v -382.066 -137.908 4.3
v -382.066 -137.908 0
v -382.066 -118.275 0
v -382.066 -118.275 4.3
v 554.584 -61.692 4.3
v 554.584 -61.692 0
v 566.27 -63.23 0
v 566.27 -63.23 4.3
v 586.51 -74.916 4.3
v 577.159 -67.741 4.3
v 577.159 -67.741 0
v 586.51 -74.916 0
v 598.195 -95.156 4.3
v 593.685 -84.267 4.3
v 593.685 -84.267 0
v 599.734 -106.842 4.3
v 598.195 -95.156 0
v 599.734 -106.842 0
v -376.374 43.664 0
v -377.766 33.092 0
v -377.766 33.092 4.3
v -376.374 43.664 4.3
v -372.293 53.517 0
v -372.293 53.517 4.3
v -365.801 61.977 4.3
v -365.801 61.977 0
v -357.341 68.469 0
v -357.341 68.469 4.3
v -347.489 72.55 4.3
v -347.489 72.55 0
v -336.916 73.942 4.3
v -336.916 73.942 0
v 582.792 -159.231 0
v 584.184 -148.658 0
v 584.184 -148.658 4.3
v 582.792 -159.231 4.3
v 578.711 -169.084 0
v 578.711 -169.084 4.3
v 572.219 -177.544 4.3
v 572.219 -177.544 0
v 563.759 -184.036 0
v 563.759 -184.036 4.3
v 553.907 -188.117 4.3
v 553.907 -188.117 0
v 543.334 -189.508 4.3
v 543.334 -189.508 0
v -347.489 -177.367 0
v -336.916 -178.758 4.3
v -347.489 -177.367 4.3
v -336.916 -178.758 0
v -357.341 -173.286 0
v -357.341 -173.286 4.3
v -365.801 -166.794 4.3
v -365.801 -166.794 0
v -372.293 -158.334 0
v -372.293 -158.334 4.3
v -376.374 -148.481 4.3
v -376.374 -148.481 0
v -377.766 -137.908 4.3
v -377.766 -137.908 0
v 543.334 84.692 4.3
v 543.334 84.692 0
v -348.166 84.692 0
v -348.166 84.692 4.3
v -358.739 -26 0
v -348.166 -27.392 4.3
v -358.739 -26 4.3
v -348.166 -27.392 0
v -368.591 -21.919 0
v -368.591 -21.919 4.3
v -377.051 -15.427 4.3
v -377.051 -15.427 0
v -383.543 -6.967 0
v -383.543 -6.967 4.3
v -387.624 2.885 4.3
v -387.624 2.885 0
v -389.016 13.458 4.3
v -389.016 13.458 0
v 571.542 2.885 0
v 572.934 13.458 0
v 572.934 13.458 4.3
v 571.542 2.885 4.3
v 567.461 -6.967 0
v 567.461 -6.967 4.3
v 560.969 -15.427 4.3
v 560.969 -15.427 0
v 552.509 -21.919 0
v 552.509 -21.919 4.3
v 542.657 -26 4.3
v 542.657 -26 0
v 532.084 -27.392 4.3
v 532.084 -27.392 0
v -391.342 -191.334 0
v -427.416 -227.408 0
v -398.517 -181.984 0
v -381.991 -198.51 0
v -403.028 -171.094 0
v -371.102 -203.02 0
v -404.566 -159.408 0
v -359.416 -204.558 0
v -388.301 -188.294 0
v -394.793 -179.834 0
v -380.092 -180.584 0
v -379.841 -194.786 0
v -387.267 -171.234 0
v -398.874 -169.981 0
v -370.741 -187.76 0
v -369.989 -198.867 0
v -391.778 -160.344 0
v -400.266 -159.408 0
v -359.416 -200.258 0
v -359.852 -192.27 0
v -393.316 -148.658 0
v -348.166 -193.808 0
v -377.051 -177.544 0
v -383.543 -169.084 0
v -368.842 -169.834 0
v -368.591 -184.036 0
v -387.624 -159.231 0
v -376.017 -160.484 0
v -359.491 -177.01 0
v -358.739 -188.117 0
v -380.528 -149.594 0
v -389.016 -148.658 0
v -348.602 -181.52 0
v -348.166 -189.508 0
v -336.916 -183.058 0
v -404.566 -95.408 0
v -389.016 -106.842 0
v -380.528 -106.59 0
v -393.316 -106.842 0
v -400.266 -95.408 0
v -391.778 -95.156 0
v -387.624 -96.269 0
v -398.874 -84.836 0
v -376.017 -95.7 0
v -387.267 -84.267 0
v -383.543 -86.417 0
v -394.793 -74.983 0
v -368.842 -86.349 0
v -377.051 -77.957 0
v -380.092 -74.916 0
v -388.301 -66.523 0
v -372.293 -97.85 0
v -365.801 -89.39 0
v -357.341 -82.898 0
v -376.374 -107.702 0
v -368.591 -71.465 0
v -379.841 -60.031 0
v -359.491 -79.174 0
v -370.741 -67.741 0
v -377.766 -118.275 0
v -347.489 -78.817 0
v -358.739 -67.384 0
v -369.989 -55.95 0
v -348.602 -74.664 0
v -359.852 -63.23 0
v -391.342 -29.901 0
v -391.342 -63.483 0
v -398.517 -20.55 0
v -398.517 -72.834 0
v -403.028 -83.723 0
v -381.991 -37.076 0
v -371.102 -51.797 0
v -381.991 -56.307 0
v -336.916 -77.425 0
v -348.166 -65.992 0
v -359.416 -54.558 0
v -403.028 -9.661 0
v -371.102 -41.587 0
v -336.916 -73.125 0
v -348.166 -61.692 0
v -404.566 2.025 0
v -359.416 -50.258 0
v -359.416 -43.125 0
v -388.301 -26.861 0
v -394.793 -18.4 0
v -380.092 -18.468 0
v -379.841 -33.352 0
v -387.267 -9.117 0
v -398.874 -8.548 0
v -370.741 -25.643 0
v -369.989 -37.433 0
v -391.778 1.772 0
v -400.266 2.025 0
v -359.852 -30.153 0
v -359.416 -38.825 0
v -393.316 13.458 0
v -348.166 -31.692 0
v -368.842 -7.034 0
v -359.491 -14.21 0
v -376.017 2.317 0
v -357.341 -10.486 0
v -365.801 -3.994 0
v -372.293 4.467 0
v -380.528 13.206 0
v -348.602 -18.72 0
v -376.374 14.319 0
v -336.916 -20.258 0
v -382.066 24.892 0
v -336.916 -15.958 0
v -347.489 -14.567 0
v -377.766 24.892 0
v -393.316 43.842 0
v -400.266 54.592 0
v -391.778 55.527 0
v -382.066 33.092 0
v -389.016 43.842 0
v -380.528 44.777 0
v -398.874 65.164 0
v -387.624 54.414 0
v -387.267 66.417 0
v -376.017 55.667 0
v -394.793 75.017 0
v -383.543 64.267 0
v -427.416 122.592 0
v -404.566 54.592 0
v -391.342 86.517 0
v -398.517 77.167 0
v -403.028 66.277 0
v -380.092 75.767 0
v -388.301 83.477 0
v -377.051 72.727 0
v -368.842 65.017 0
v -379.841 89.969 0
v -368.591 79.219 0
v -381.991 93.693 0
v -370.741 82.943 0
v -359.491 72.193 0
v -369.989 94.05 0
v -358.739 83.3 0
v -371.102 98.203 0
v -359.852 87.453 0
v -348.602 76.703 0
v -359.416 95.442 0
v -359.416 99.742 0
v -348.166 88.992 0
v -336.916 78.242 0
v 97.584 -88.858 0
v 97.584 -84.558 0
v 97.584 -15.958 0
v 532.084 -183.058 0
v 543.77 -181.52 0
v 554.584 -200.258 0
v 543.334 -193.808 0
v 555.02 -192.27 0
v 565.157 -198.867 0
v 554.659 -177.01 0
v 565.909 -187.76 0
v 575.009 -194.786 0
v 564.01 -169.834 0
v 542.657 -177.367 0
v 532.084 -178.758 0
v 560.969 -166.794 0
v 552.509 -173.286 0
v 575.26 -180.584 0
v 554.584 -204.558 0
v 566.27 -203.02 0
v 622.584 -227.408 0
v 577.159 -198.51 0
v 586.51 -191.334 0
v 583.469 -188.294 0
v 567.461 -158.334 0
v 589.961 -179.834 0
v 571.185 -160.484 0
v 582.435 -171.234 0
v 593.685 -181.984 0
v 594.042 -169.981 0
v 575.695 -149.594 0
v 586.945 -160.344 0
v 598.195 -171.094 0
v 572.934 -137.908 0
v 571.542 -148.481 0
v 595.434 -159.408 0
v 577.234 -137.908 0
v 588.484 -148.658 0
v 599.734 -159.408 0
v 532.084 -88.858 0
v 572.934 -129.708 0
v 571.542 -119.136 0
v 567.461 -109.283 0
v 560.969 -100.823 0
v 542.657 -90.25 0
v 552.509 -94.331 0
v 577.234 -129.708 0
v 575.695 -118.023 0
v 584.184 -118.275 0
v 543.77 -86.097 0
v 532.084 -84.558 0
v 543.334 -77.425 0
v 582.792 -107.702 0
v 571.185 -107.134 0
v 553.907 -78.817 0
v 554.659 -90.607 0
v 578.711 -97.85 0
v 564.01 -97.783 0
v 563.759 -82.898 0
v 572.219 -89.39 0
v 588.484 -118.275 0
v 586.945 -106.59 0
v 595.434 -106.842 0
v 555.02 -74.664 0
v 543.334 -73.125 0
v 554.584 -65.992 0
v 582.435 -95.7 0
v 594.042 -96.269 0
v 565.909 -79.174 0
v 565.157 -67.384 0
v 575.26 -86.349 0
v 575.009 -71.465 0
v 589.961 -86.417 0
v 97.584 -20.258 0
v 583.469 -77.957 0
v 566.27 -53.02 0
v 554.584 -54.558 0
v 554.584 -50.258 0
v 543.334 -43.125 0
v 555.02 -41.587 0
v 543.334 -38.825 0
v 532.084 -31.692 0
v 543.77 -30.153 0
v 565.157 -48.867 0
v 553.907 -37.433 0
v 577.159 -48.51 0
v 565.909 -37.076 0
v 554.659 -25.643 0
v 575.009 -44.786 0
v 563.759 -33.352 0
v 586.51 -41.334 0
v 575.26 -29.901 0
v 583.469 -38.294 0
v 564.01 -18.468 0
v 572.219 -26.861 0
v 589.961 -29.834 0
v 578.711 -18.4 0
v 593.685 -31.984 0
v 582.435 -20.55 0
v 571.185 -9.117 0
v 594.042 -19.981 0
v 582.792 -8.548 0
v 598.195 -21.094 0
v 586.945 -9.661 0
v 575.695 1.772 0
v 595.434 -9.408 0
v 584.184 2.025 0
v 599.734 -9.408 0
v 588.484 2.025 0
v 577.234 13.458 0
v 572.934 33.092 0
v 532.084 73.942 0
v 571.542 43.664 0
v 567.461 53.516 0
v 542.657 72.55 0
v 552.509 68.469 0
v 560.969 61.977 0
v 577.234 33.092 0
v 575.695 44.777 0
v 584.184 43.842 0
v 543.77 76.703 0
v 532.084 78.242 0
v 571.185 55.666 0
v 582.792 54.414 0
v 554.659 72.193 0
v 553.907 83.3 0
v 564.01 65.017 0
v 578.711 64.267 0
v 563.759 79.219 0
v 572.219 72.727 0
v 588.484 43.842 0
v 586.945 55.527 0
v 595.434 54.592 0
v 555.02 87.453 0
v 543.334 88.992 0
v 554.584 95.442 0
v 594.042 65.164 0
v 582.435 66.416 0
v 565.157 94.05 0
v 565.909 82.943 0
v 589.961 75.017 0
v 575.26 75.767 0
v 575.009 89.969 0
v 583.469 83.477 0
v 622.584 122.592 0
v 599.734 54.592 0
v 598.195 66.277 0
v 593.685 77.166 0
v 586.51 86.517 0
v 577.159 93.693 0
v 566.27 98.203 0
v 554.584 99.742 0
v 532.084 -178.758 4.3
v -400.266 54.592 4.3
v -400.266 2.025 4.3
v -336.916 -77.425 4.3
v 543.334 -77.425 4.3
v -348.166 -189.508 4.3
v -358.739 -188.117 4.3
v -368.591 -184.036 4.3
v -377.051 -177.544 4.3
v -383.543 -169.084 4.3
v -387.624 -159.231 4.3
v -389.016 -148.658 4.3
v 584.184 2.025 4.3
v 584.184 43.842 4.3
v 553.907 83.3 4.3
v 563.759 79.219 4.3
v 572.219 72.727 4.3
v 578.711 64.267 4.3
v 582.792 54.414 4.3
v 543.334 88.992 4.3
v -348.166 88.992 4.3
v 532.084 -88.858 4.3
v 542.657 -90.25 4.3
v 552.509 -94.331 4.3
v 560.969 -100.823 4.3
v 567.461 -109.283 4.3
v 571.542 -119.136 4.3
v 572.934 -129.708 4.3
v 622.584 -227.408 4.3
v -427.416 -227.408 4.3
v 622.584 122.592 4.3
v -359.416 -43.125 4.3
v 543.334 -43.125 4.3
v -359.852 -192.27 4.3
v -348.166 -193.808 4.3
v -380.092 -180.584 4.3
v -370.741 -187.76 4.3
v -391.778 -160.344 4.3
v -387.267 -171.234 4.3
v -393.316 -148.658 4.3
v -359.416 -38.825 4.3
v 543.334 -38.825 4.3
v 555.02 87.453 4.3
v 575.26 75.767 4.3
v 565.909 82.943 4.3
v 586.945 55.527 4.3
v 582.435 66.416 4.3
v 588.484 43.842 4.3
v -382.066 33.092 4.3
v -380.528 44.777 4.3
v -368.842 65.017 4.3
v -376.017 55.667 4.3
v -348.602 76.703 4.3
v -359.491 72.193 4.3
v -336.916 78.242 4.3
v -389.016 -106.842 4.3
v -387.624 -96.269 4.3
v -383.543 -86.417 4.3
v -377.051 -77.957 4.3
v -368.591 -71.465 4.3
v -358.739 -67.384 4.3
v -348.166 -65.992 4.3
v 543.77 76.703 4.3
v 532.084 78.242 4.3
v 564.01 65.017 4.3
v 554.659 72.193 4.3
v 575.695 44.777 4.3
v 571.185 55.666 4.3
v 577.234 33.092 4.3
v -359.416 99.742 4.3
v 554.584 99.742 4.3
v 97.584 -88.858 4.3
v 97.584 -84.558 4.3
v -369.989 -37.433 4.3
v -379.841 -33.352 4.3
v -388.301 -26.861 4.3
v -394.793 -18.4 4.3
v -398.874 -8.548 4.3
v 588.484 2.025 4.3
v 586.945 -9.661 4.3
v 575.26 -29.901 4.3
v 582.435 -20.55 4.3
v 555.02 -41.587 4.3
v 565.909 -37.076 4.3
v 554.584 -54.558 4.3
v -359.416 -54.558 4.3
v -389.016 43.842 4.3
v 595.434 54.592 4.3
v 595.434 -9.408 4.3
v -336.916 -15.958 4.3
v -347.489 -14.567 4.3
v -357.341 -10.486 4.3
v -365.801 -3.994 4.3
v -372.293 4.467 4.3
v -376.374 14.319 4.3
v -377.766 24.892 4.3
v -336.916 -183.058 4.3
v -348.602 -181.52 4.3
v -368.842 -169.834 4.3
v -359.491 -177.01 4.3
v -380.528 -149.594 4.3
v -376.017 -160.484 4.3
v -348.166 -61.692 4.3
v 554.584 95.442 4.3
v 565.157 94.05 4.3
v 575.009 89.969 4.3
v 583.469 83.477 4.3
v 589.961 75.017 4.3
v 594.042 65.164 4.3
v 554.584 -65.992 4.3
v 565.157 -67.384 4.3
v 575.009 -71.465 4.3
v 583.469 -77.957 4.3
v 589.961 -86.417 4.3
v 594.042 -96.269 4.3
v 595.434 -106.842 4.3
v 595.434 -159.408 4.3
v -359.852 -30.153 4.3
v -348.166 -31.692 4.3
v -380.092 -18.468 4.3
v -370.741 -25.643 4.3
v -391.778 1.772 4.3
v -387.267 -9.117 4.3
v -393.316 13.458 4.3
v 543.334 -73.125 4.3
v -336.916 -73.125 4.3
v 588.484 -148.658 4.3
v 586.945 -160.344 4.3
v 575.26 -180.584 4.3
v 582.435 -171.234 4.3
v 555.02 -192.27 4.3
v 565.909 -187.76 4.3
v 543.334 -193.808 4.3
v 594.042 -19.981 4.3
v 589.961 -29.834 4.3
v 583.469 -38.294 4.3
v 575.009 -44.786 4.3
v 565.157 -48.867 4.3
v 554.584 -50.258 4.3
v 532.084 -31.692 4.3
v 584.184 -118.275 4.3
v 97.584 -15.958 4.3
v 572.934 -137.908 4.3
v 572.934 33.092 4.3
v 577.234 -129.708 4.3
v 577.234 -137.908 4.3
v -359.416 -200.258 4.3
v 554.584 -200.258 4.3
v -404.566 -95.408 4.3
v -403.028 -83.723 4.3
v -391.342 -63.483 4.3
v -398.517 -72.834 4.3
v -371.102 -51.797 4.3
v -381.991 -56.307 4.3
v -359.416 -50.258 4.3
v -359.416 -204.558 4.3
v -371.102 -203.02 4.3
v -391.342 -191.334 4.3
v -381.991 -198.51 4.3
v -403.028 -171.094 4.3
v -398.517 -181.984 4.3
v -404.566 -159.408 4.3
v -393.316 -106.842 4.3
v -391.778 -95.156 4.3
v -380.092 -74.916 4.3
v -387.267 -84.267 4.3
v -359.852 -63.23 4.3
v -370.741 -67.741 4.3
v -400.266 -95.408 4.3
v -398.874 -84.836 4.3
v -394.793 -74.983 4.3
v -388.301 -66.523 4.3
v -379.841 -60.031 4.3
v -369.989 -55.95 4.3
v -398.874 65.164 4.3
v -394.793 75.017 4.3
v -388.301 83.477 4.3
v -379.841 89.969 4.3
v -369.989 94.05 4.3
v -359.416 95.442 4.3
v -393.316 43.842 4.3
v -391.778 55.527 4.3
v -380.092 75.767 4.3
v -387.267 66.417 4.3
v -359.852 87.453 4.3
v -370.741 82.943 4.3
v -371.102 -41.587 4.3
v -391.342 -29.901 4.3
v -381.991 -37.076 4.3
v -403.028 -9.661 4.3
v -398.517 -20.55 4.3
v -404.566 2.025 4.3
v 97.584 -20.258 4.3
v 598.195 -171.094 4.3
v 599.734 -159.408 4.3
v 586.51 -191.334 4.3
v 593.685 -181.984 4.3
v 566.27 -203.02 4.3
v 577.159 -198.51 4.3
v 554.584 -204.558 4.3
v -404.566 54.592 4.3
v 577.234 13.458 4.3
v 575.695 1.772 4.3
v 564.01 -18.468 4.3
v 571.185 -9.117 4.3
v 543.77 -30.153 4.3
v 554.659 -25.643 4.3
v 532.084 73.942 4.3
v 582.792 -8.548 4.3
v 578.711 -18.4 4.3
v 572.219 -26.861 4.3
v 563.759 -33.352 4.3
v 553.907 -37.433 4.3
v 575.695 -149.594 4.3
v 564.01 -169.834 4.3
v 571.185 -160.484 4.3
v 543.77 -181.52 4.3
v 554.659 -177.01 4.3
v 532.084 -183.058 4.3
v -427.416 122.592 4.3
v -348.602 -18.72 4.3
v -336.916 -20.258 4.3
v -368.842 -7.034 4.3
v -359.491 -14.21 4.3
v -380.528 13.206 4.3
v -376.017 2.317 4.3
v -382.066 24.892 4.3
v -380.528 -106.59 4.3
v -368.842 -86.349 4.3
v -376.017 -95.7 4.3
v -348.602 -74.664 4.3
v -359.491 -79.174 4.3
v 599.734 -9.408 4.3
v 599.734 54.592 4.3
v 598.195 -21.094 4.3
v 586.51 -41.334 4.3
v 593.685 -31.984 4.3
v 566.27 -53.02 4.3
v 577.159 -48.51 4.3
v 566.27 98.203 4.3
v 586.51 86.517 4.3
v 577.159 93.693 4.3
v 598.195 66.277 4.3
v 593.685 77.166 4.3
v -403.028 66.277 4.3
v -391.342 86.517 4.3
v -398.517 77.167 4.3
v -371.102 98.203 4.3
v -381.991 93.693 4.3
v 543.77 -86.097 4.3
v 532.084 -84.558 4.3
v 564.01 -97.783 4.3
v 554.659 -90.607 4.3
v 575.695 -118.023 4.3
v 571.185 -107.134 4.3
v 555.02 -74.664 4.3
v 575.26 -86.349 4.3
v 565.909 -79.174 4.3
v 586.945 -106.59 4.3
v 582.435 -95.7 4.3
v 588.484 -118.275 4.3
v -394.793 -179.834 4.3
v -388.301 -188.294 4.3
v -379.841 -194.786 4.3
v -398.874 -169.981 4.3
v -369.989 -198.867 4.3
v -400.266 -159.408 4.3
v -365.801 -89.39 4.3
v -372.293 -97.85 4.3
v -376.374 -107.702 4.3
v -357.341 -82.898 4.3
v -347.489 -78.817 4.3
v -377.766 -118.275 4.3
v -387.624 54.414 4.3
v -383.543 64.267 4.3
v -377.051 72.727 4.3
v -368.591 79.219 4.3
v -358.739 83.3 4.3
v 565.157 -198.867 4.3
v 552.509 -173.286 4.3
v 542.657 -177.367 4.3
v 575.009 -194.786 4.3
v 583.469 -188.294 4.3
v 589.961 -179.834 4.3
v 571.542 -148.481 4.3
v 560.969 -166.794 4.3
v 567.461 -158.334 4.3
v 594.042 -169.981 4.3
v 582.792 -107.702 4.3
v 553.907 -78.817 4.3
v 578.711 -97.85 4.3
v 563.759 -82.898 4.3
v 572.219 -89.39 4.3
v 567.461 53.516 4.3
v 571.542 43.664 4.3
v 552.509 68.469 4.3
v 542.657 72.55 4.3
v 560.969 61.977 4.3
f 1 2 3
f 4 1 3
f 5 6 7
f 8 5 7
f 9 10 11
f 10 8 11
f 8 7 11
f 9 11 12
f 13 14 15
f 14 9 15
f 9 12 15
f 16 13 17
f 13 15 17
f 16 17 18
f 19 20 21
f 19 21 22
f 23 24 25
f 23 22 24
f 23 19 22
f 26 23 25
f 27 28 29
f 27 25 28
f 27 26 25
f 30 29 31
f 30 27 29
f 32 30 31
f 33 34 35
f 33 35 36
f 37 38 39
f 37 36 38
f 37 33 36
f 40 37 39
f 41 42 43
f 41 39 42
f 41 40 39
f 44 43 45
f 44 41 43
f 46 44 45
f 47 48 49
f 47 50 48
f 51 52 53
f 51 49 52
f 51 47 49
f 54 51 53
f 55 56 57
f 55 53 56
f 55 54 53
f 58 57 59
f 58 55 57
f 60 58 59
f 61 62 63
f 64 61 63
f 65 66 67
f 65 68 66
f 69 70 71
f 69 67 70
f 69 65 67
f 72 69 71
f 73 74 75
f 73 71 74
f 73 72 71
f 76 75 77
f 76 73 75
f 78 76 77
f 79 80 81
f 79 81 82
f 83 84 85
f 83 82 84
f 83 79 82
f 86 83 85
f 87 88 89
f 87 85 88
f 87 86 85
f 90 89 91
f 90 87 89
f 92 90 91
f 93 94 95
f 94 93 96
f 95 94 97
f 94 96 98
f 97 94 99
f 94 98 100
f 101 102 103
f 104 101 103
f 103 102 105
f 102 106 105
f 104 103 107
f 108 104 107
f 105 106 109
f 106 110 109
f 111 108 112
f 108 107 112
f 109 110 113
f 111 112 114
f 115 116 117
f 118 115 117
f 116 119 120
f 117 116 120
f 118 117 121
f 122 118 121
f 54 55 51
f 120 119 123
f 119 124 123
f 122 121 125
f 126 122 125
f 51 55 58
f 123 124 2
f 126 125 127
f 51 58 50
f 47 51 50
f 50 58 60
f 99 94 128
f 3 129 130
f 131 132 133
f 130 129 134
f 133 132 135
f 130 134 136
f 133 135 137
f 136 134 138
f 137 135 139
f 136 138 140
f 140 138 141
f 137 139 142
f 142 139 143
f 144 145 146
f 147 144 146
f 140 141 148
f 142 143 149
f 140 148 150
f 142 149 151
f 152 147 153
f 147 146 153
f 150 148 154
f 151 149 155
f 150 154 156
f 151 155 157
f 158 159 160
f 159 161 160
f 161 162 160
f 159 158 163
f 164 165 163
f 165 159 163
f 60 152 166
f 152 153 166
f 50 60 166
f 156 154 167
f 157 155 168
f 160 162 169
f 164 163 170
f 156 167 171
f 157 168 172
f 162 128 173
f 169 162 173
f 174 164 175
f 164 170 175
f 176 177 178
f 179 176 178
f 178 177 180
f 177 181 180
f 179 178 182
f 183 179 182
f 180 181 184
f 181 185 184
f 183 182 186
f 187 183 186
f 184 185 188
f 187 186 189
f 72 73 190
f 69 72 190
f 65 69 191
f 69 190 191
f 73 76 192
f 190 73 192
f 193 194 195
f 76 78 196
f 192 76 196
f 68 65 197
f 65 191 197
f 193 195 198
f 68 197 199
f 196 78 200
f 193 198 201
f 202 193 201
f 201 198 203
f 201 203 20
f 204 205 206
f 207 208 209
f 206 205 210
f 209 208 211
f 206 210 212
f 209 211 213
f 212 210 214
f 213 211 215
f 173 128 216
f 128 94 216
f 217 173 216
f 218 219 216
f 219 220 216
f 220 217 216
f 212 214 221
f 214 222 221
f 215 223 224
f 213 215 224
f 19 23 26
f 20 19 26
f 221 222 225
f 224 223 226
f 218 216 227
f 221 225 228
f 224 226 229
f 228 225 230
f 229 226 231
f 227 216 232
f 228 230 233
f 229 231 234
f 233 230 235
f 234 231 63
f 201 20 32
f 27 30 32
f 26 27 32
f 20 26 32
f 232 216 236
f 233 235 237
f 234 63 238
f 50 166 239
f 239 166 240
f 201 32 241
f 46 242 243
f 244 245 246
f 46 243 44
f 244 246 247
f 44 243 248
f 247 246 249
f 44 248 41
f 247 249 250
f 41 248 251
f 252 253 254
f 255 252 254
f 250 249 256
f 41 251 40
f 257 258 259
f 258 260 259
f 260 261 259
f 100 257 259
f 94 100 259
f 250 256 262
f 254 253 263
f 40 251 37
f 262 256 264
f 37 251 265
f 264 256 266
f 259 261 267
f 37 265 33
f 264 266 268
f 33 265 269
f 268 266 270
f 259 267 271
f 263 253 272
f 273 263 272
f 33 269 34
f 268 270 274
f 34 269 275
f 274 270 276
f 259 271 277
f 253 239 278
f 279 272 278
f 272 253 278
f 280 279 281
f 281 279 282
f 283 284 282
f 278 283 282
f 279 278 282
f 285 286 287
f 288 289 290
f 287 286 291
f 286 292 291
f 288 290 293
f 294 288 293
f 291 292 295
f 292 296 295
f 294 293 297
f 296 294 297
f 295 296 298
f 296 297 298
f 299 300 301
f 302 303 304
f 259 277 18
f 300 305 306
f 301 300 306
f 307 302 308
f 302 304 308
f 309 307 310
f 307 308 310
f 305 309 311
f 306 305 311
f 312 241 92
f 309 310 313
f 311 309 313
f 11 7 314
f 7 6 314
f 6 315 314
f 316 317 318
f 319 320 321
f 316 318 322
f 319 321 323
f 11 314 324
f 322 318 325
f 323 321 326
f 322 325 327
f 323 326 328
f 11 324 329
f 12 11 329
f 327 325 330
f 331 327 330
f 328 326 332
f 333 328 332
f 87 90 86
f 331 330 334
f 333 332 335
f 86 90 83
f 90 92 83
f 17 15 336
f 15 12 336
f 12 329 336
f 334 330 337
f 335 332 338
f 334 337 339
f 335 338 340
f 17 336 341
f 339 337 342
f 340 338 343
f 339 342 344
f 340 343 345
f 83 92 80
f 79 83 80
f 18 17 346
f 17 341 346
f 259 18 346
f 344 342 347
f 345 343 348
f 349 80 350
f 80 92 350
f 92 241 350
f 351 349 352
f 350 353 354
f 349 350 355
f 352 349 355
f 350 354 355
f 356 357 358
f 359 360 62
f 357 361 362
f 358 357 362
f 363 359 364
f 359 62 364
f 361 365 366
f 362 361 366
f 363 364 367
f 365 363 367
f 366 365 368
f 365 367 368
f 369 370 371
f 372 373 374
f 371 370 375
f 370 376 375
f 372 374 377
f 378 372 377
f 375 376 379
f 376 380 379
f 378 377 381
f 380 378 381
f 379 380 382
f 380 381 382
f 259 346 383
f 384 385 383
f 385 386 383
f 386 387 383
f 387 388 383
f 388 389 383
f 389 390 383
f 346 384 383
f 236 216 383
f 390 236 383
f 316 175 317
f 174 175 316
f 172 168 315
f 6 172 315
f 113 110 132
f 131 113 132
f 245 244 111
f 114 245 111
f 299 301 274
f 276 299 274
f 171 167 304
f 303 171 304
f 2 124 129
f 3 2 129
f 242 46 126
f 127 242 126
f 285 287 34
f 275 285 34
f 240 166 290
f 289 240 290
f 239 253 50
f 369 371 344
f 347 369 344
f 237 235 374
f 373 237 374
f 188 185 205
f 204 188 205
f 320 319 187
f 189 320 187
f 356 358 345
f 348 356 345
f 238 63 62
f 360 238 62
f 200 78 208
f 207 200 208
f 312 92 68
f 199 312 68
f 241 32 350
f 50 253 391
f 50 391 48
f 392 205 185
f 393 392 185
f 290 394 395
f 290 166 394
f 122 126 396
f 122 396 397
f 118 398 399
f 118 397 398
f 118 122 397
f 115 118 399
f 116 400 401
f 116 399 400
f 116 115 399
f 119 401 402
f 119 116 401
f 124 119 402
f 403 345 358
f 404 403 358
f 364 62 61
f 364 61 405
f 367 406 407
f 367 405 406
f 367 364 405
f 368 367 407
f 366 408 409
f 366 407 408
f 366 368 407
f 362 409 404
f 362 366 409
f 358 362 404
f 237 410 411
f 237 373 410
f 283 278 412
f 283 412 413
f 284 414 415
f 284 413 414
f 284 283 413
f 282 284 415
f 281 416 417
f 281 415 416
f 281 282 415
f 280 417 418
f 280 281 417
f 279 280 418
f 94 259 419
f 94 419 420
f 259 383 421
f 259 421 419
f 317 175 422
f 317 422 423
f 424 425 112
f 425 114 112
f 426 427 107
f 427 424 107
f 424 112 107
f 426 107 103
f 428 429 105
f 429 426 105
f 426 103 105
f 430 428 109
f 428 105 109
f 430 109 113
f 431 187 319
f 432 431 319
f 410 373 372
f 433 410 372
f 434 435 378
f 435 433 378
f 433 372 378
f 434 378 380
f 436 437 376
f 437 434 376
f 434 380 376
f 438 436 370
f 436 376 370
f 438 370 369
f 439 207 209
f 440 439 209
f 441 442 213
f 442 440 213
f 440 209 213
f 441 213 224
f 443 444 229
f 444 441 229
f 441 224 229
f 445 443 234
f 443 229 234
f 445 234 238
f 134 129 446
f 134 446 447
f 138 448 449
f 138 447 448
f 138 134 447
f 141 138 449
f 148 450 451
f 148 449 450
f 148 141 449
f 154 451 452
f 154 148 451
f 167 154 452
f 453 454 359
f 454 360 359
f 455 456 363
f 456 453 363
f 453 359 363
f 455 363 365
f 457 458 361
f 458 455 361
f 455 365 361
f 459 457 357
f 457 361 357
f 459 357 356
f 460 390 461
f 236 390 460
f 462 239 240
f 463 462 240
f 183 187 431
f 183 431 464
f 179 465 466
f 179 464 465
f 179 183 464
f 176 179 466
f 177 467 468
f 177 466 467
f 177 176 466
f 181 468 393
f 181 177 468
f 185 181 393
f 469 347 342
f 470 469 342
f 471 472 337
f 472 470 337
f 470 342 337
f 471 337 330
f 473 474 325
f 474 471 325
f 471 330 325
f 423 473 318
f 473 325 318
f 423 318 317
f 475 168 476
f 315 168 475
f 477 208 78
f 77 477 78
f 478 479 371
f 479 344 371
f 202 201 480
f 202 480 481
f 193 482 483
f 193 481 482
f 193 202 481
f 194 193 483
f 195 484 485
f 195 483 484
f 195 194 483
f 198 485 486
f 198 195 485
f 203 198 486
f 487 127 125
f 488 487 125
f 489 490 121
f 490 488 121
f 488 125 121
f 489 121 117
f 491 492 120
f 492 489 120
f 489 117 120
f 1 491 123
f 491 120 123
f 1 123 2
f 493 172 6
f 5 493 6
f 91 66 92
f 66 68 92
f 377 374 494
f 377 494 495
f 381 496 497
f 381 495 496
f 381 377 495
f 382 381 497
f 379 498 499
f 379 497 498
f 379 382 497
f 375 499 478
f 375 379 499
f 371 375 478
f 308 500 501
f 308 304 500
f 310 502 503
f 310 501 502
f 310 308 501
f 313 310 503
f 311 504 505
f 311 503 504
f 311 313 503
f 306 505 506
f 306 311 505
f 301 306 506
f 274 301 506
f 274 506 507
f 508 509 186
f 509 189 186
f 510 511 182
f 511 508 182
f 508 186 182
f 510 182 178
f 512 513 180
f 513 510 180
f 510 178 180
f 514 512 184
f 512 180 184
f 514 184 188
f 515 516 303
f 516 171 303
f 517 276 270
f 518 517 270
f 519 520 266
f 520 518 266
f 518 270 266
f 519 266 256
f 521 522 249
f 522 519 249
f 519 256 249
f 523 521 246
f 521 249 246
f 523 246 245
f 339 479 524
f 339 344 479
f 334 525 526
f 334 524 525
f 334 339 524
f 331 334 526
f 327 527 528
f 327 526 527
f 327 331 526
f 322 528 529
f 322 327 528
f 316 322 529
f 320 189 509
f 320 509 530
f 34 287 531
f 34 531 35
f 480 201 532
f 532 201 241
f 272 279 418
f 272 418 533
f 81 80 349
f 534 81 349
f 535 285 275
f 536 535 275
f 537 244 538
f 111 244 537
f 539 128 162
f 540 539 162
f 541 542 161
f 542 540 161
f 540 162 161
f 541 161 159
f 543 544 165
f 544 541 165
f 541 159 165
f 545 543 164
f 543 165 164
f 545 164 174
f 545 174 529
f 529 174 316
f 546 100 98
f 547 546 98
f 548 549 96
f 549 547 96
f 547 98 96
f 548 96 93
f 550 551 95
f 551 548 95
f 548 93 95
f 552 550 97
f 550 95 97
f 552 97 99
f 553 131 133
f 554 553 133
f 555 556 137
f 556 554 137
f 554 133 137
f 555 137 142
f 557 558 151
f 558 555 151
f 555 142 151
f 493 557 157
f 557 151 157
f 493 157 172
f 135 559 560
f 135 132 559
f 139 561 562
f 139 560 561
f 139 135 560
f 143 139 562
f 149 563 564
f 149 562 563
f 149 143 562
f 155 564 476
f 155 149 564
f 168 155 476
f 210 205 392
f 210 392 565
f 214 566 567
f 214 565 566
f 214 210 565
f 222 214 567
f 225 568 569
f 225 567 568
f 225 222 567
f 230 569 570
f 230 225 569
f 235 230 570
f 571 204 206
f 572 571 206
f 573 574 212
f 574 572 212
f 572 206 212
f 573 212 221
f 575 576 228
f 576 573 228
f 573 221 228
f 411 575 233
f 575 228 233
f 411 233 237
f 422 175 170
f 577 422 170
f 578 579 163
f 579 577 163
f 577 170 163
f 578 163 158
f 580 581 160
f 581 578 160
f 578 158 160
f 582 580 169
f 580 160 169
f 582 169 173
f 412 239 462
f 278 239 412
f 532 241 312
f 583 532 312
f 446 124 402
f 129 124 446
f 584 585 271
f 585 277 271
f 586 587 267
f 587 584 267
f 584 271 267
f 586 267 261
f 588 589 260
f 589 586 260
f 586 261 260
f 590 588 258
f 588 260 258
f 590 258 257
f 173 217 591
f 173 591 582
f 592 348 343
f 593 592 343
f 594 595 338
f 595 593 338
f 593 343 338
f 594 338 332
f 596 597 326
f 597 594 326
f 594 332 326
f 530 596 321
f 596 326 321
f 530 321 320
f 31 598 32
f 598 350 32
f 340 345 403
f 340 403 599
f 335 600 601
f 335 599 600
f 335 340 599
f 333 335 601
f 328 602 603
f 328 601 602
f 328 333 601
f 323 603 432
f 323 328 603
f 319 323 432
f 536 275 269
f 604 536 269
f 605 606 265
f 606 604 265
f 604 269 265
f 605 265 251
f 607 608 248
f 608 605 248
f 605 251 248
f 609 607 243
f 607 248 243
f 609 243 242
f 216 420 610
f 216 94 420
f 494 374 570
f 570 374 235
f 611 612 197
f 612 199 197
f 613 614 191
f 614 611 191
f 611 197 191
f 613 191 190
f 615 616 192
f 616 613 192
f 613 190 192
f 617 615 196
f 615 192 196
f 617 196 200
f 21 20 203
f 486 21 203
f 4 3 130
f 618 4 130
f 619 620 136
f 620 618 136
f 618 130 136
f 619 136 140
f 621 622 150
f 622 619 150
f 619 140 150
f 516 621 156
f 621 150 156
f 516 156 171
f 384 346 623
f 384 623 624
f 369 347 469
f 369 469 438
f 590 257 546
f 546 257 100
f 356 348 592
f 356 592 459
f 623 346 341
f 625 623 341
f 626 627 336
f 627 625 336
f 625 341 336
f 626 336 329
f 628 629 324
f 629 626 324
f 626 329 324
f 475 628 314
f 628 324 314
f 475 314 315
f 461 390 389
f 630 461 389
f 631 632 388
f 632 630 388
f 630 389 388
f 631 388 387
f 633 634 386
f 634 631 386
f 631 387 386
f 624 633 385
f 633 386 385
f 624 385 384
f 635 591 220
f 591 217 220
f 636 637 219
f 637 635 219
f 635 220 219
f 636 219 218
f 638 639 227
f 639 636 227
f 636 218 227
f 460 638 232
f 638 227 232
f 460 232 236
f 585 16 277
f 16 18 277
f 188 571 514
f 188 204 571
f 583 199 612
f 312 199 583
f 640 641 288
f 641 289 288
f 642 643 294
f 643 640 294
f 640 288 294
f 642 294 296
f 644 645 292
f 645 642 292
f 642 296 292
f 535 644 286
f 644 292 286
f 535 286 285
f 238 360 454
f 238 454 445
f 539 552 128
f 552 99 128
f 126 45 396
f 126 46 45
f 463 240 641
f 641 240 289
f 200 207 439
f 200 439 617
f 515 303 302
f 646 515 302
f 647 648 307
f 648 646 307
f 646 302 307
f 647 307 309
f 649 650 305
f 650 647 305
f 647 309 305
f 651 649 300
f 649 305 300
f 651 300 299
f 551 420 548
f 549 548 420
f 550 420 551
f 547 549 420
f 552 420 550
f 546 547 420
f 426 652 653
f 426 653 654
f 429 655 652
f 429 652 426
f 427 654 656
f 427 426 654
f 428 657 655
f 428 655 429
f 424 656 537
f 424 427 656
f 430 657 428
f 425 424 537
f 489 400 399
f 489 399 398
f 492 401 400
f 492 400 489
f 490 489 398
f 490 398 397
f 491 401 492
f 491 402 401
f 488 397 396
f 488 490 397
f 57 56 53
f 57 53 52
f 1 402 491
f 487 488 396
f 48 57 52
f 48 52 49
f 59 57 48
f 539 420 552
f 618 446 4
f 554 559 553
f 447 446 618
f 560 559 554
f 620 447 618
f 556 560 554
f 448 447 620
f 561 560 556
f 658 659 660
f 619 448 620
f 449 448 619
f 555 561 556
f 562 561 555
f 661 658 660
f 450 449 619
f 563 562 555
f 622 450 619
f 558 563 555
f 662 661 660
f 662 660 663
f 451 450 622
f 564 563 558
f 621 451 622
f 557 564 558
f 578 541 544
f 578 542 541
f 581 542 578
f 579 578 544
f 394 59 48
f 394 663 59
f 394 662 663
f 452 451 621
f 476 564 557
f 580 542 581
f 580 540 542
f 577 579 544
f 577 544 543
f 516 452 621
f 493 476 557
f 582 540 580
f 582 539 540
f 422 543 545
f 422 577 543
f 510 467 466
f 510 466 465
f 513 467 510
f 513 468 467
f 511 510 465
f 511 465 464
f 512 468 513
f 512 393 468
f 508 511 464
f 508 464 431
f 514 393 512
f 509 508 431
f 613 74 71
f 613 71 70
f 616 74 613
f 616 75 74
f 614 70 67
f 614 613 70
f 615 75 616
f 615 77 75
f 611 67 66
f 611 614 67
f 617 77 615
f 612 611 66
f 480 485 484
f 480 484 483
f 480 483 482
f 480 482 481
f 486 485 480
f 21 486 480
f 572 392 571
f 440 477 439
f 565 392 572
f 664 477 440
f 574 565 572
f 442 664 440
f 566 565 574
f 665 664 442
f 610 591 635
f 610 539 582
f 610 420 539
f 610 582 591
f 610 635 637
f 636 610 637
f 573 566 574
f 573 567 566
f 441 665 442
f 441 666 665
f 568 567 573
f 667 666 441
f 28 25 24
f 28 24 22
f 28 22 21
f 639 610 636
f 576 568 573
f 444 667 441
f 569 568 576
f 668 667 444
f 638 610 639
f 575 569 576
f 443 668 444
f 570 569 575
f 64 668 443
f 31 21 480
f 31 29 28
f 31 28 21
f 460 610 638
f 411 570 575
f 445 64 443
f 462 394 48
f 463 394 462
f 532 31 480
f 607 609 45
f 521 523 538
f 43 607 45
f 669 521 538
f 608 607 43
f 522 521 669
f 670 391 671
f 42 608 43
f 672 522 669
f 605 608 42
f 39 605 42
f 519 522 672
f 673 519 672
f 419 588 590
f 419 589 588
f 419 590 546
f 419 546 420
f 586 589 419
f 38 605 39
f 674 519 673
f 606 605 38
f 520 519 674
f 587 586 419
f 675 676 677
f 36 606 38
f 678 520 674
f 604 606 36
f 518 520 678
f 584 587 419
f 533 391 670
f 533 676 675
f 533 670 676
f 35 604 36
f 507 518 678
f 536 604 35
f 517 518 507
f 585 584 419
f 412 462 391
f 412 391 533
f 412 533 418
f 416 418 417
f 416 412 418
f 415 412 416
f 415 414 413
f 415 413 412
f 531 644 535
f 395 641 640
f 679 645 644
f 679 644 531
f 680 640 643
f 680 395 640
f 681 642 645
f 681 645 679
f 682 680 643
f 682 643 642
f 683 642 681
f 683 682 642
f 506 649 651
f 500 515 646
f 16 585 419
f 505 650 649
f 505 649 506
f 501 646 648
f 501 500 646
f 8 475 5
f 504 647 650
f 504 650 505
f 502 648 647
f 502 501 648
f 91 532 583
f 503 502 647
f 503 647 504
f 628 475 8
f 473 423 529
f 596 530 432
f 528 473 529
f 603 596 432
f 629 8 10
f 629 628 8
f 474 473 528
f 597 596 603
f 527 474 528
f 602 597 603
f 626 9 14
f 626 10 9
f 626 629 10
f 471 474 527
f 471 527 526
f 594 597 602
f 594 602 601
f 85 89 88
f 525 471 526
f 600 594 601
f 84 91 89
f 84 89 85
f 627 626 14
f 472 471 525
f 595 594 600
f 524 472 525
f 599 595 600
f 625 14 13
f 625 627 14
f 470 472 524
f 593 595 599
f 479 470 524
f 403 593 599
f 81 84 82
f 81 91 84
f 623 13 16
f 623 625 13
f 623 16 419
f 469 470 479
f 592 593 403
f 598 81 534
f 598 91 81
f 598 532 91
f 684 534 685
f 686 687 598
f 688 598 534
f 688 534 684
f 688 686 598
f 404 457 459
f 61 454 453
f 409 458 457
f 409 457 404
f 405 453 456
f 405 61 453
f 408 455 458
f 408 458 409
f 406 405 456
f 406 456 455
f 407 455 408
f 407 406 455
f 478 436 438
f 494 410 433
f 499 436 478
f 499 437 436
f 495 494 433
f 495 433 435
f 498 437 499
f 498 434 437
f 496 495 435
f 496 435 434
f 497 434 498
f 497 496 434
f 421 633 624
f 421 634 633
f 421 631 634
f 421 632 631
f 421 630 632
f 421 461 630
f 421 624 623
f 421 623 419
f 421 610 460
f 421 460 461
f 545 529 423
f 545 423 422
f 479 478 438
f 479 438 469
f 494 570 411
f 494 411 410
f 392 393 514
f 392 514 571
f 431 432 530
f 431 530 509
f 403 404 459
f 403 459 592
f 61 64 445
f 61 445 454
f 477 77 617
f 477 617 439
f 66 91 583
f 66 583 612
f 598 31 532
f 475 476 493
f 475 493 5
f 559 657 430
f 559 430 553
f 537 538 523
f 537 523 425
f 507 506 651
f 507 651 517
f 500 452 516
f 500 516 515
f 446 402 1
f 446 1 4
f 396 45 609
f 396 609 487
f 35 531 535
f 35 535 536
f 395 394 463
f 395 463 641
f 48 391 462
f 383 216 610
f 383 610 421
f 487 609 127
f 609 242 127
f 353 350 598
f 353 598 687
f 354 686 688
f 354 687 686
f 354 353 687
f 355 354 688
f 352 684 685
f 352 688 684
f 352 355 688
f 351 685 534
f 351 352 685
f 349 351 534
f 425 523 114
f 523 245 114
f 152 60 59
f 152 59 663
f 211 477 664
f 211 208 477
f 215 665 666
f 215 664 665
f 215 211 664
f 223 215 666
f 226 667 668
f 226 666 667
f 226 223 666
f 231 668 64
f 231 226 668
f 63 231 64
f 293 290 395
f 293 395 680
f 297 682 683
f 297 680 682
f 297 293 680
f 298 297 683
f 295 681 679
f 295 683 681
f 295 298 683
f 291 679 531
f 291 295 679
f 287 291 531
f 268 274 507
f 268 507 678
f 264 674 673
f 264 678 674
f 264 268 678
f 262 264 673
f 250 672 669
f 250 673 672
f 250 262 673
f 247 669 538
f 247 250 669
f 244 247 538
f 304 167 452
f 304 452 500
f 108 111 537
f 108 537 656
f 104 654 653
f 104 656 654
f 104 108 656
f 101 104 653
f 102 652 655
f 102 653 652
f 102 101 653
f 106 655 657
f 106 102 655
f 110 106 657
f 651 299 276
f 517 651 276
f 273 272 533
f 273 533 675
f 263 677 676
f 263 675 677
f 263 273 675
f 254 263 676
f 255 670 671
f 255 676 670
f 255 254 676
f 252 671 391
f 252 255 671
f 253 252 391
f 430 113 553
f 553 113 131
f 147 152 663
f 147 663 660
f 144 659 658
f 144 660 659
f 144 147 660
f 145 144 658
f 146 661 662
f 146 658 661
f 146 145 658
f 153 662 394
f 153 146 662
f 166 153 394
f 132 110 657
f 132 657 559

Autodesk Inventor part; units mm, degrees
ref_plane "YZ Plane" through (0, 0, 0) normal (1, 0, 0) x (0, 1, 0)
ref_plane "XZ Plane" through (0, 0, 0) normal (0, 1, 0) x (-1, 0, 0)
ref_plane "XY Plane" through (0, 0, 0) normal (0, 0, 1) x (1, 0, 0)
sketch "Sketch1" plane through (0, 0, 0) normal (0, 0, 1) x (1, 0, 0)
  line L0 (97.5839, -88.8585) -> (97.5839, -84.5585) projected
  line L1 (97.5839, -88.8585) -> (532.0839, -88.8585) projected
  arc A0 (572.9339, -129.7085) -> (532.0839, -88.8585) centre (532.0839, -129.7085) ccw projected
  line L2 (572.9339, -129.7085) -> (572.9339, -137.9085) projected
  arc A1 (532.0839, -178.7585) -> (572.9339, -137.9085) centre (532.0839, -137.9085) ccw projected
  line L3 (532.0839, -178.7585) -> (-336.9161, -178.7585) projected
  arc A2 (-377.7661, -137.9085) -> (-336.9161, -178.7585) centre (-336.9161, -137.9085) ccw projected
  line L4 (-377.7661, -137.9085) -> (-377.7661, -118.2752) projected
  arc A3 (-336.9161, -77.4252) -> (-377.7661, -118.2752) centre (-336.9161, -118.2752) ccw projected
  line L5 (-336.9161, -77.4252) -> (543.3339, -77.4252) projected
  arc A4 (584.1839, -118.2752) -> (543.3339, -77.4252) centre (543.3339, -118.2752) ccw projected
  line L6 (584.1839, -118.2752) -> (584.1839, -148.6585) projected
  arc A5 (543.3339, -189.5085) -> (584.1839, -148.6585) centre (543.3339, -148.6585) ccw projected
  line L7 (543.3339, -189.5085) -> (-348.1661, -189.5085) projected
  arc A6 (-389.0161, -148.6585) -> (-348.1661, -189.5085) centre (-348.1661, -148.6585) ccw projected
  line L8 (-389.0161, -148.6585) -> (-389.0161, -106.8419) projected
  arc A7 (-348.1661, -65.9919) -> (-389.0161, -106.8419) centre (-348.1661, -106.8419) ccw projected
  line L9 (-348.1661, -65.9919) -> (554.5839, -65.9919) projected
  arc A8 (595.4339, -106.8419) -> (554.5839, -65.9919) centre (554.5839, -106.8419) ccw projected
  line L10 (595.4339, -106.8419) -> (595.4339, -159.4085) projected
  arc A9 (554.5839, -200.2585) -> (595.4339, -159.4085) centre (554.5839, -159.4085) ccw projected
  line L11 (554.5839, -200.2585) -> (-359.4161, -200.2585) projected
  arc A10 (-400.2661, -159.4085) -> (-359.4161, -200.2585) centre (-359.4161, -159.4085) ccw projected
  line L12 (-400.2661, -159.4085) -> (-400.2661, -95.4085) projected
  arc A11 (-359.4161, -54.5585) -> (-400.2661, -95.4085) centre (-359.4161, -95.4085) ccw projected
  line L13 (-359.4161, -54.5585) -> (554.5839, -54.5585) projected
  arc A12 (554.5839, -54.5585) -> (599.7339, -9.4085) centre (554.5839, -9.4085) ccw projected
  line L14 (599.7339, -9.4085) -> (599.7339, 54.5915) projected
  arc A13 (599.7339, 54.5915) -> (554.5839, 99.7415) centre (554.5839, 54.5915) ccw projected
  line L15 (554.5839, 99.7415) -> (-359.4161, 99.7415) projected
  arc A14 (-359.4161, 99.7415) -> (-404.5661, 54.5915) centre (-359.4161, 54.5915) ccw projected
  line L16 (-404.5661, 54.5915) -> (-404.5661, 2.0248) projected
  arc A15 (-404.5661, 2.0248) -> (-359.4161, -43.1252) centre (-359.4161, 2.0248) ccw projected
  line L17 (-359.4161, -43.1252) -> (543.3339, -43.1252) projected
  arc A16 (543.3339, -43.1252) -> (588.4839, 2.0248) centre (543.3339, 2.0248) ccw projected
  line L18 (588.4839, 2.0248) -> (588.4839, 43.8415) projected
  arc A17 (588.4839, 43.8415) -> (543.3339, 88.9915) centre (543.3339, 43.8415) ccw projected
  line L19 (543.3339, 88.9915) -> (-348.1661, 88.9915) projected
  arc A18 (-348.1661, 88.9915) -> (-393.3161, 43.8415) centre (-348.1661, 43.8415) ccw projected
  line L20 (-393.3161, 43.8415) -> (-393.3161, 13.4581) projected
  arc A19 (-393.3161, 13.4581) -> (-348.1661, -31.6919) centre (-348.1661, 13.4581) ccw projected
  line L21 (-348.1661, -31.6919) -> (532.0839, -31.6919) projected
  arc A20 (532.0839, -31.6919) -> (577.2339, 13.4581) centre (532.0839, 13.4581) ccw projected
  line L22 (577.2339, 13.4581) -> (577.2339, 33.0915) projected
  arc A21 (577.2339, 33.0915) -> (532.0839, 78.2415) centre (532.0839, 33.0915) ccw projected
  line L23 (532.0839, 78.2415) -> (-336.9161, 78.2415) projected
  arc A22 (-336.9161, 78.2415) -> (-382.0661, 33.0915) centre (-336.9161, 33.0915) ccw projected
  line L24 (-382.0661, 33.0915) -> (-382.0661, 24.8915) projected
  arc A23 (-382.0661, 24.8915) -> (-336.9161, -20.2585) centre (-336.9161, 24.8915) ccw projected
  line L25 (-336.9161, -20.2585) -> (97.5839, -20.2585) projected
  line L26 (97.5839, -15.9585) -> (97.5839, -20.2585) projected
  line L27 (-336.9161, -15.9585) -> (97.5839, -15.9585) projected
  arc A24 (-377.7661, 24.8915) -> (-336.9161, -15.9585) centre (-336.9161, 24.8915) ccw projected
  line L28 (-377.7661, 33.0915) -> (-377.7661, 24.8915) projected
  arc A25 (-336.9161, 73.9415) -> (-377.7661, 33.0915) centre (-336.9161, 33.0915) ccw projected
  line L29 (532.0839, 73.9415) -> (-336.9161, 73.9415) projected
  arc A26 (572.9339, 33.0915) -> (532.0839, 73.9415) centre (532.0839, 33.0915) ccw projected
  line L30 (572.9339, 13.4581) -> (572.9339, 33.0915) projected
  arc A27 (532.0839, -27.3919) -> (572.9339, 13.4581) centre (532.0839, 13.4581) ccw projected
  line L31 (-348.1661, -27.3919) -> (532.0839, -27.3919) projected
  arc A28 (-389.0161, 13.4581) -> (-348.1661, -27.3919) centre (-348.1661, 13.4581) ccw projected
  line L32 (-389.0161, 43.8415) -> (-389.0161, 13.4581) projected
  arc A29 (-348.1661, 84.6915) -> (-389.0161, 43.8415) centre (-348.1661, 43.8415) ccw projected
  line L33 (543.3339, 84.6915) -> (-348.1661, 84.6915) projected
  arc A30 (584.1839, 43.8415) -> (543.3339, 84.6915) centre (543.3339, 43.8415) ccw projected
  line L34 (584.1839, 2.0248) -> (584.1839, 43.8415) projected
  arc A31 (543.3339, -38.8252) -> (584.1839, 2.0248) centre (543.3339, 2.0248) ccw projected
  line L35 (-359.4161, -38.8252) -> (543.3339, -38.8252) projected
  arc A32 (-400.2661, 2.0248) -> (-359.4161, -38.8252) centre (-359.4161, 2.0248) ccw projected
  line L36 (-400.2661, 54.5915) -> (-400.2661, 2.0248) projected
  arc A33 (-359.4161, 95.4415) -> (-400.2661, 54.5915) centre (-359.4161, 54.5915) ccw projected
  line L37 (554.5839, 95.4415) -> (-359.4161, 95.4415) projected
  arc A34 (595.4339, 54.5915) -> (554.5839, 95.4415) centre (554.5839, 54.5915) ccw projected
  line L38 (595.4339, -9.4085) -> (595.4339, 54.5915) projected
  arc A35 (554.5839, -50.2585) -> (595.4339, -9.4085) centre (554.5839, -9.4085) ccw projected
  line L39 (-359.4161, -50.2585) -> (554.5839, -50.2585) projected
  arc A36 (-359.4161, -50.2585) -> (-404.5661, -95.4085) centre (-359.4161, -95.4085) ccw projected
  line L40 (-404.5661, -159.4085) -> (-404.5661, -95.4085) projected
  arc A37 (-404.5661, -159.4085) -> (-359.4161, -204.5585) centre (-359.4161, -159.4085) ccw projected
  line L41 (554.5839, -204.5585) -> (-359.4161, -204.5585) projected
  arc A38 (554.5839, -204.5585) -> (599.7339, -159.4085) centre (554.5839, -159.4085) ccw projected
  line L42 (599.7339, -106.8419) -> (599.7339, -159.4085) projected
  arc A39 (599.7339, -106.8419) -> (554.5839, -61.6919) centre (554.5839, -106.8419) ccw projected
  line L43 (-348.1661, -61.6919) -> (554.5839, -61.6919) projected
  arc A40 (-348.1661, -61.6919) -> (-393.3161, -106.8419) centre (-348.1661, -106.8419) ccw projected
  line L44 (-393.3161, -148.6585) -> (-393.3161, -106.8419) projected
  arc A41 (-393.3161, -148.6585) -> (-348.1661, -193.8085) centre (-348.1661, -148.6585) ccw projected
  line L45 (543.3339, -193.8085) -> (-348.1661, -193.8085) projected
  arc A42 (543.3339, -193.8085) -> (588.4839, -148.6585) centre (543.3339, -148.6585) ccw projected
  line L46 (588.4839, -118.2752) -> (588.4839, -148.6585) projected
  arc A43 (588.4839, -118.2752) -> (543.3339, -73.1252) centre (543.3339, -118.2752) ccw projected
  line L47 (-336.9161, -73.1252) -> (543.3339, -73.1252) projected
  arc A44 (-336.9161, -73.1252) -> (-382.0661, -118.2752) centre (-336.9161, -118.2752) ccw projected
  line L48 (-382.0661, -137.9085) -> (-382.0661, -118.2752) projected
  arc A45 (-382.0661, -137.9085) -> (-336.9161, -183.0585) centre (-336.9161, -137.9085) ccw projected
  line L49 (532.0839, -183.0585) -> (-336.9161, -183.0585) projected
  arc A46 (532.0839, -183.0585) -> (577.2339, -137.9085) centre (532.0839, -137.9085) ccw projected
  line L50 (577.2339, -129.7085) -> (577.2339, -137.9085) projected
  arc A47 (577.2339, -129.7085) -> (532.0839, -84.5585) centre (532.0839, -129.7085) ccw projected
  line L51 (97.5839, -84.5585) -> (532.0839, -84.5585) projected
  line L52 (97.5839, -20.2585) -> (97.5839, -84.5585) construction
  line L53 (97.5839, -52.4085) -> (22.8086, -52.4085)
  line L54 (622.5839, -227.4085) -> (-427.4161, -227.4085)
  line L55 (-427.4161, -227.4085) -> (-427.4161, 122.5915)
  line L56 (-427.4161, 122.5915) -> (622.5839, 122.5915)
  line L57 (622.5839, 122.5915) -> (622.5839, -227.4085)
  line L58 (622.5839, -227.4085) -> (-427.4161, 122.5915) construction
  line L59 (-427.4161, -227.4085) -> (622.5839, 122.5915) construction
  point P0 (0, 0)
  dimension "d0" = 1050
  dimension "d1" = 350
extrude "Extrusion1" add sketch "Sketch1" along normal blind 4.3
properties material "PVC-Piping"
